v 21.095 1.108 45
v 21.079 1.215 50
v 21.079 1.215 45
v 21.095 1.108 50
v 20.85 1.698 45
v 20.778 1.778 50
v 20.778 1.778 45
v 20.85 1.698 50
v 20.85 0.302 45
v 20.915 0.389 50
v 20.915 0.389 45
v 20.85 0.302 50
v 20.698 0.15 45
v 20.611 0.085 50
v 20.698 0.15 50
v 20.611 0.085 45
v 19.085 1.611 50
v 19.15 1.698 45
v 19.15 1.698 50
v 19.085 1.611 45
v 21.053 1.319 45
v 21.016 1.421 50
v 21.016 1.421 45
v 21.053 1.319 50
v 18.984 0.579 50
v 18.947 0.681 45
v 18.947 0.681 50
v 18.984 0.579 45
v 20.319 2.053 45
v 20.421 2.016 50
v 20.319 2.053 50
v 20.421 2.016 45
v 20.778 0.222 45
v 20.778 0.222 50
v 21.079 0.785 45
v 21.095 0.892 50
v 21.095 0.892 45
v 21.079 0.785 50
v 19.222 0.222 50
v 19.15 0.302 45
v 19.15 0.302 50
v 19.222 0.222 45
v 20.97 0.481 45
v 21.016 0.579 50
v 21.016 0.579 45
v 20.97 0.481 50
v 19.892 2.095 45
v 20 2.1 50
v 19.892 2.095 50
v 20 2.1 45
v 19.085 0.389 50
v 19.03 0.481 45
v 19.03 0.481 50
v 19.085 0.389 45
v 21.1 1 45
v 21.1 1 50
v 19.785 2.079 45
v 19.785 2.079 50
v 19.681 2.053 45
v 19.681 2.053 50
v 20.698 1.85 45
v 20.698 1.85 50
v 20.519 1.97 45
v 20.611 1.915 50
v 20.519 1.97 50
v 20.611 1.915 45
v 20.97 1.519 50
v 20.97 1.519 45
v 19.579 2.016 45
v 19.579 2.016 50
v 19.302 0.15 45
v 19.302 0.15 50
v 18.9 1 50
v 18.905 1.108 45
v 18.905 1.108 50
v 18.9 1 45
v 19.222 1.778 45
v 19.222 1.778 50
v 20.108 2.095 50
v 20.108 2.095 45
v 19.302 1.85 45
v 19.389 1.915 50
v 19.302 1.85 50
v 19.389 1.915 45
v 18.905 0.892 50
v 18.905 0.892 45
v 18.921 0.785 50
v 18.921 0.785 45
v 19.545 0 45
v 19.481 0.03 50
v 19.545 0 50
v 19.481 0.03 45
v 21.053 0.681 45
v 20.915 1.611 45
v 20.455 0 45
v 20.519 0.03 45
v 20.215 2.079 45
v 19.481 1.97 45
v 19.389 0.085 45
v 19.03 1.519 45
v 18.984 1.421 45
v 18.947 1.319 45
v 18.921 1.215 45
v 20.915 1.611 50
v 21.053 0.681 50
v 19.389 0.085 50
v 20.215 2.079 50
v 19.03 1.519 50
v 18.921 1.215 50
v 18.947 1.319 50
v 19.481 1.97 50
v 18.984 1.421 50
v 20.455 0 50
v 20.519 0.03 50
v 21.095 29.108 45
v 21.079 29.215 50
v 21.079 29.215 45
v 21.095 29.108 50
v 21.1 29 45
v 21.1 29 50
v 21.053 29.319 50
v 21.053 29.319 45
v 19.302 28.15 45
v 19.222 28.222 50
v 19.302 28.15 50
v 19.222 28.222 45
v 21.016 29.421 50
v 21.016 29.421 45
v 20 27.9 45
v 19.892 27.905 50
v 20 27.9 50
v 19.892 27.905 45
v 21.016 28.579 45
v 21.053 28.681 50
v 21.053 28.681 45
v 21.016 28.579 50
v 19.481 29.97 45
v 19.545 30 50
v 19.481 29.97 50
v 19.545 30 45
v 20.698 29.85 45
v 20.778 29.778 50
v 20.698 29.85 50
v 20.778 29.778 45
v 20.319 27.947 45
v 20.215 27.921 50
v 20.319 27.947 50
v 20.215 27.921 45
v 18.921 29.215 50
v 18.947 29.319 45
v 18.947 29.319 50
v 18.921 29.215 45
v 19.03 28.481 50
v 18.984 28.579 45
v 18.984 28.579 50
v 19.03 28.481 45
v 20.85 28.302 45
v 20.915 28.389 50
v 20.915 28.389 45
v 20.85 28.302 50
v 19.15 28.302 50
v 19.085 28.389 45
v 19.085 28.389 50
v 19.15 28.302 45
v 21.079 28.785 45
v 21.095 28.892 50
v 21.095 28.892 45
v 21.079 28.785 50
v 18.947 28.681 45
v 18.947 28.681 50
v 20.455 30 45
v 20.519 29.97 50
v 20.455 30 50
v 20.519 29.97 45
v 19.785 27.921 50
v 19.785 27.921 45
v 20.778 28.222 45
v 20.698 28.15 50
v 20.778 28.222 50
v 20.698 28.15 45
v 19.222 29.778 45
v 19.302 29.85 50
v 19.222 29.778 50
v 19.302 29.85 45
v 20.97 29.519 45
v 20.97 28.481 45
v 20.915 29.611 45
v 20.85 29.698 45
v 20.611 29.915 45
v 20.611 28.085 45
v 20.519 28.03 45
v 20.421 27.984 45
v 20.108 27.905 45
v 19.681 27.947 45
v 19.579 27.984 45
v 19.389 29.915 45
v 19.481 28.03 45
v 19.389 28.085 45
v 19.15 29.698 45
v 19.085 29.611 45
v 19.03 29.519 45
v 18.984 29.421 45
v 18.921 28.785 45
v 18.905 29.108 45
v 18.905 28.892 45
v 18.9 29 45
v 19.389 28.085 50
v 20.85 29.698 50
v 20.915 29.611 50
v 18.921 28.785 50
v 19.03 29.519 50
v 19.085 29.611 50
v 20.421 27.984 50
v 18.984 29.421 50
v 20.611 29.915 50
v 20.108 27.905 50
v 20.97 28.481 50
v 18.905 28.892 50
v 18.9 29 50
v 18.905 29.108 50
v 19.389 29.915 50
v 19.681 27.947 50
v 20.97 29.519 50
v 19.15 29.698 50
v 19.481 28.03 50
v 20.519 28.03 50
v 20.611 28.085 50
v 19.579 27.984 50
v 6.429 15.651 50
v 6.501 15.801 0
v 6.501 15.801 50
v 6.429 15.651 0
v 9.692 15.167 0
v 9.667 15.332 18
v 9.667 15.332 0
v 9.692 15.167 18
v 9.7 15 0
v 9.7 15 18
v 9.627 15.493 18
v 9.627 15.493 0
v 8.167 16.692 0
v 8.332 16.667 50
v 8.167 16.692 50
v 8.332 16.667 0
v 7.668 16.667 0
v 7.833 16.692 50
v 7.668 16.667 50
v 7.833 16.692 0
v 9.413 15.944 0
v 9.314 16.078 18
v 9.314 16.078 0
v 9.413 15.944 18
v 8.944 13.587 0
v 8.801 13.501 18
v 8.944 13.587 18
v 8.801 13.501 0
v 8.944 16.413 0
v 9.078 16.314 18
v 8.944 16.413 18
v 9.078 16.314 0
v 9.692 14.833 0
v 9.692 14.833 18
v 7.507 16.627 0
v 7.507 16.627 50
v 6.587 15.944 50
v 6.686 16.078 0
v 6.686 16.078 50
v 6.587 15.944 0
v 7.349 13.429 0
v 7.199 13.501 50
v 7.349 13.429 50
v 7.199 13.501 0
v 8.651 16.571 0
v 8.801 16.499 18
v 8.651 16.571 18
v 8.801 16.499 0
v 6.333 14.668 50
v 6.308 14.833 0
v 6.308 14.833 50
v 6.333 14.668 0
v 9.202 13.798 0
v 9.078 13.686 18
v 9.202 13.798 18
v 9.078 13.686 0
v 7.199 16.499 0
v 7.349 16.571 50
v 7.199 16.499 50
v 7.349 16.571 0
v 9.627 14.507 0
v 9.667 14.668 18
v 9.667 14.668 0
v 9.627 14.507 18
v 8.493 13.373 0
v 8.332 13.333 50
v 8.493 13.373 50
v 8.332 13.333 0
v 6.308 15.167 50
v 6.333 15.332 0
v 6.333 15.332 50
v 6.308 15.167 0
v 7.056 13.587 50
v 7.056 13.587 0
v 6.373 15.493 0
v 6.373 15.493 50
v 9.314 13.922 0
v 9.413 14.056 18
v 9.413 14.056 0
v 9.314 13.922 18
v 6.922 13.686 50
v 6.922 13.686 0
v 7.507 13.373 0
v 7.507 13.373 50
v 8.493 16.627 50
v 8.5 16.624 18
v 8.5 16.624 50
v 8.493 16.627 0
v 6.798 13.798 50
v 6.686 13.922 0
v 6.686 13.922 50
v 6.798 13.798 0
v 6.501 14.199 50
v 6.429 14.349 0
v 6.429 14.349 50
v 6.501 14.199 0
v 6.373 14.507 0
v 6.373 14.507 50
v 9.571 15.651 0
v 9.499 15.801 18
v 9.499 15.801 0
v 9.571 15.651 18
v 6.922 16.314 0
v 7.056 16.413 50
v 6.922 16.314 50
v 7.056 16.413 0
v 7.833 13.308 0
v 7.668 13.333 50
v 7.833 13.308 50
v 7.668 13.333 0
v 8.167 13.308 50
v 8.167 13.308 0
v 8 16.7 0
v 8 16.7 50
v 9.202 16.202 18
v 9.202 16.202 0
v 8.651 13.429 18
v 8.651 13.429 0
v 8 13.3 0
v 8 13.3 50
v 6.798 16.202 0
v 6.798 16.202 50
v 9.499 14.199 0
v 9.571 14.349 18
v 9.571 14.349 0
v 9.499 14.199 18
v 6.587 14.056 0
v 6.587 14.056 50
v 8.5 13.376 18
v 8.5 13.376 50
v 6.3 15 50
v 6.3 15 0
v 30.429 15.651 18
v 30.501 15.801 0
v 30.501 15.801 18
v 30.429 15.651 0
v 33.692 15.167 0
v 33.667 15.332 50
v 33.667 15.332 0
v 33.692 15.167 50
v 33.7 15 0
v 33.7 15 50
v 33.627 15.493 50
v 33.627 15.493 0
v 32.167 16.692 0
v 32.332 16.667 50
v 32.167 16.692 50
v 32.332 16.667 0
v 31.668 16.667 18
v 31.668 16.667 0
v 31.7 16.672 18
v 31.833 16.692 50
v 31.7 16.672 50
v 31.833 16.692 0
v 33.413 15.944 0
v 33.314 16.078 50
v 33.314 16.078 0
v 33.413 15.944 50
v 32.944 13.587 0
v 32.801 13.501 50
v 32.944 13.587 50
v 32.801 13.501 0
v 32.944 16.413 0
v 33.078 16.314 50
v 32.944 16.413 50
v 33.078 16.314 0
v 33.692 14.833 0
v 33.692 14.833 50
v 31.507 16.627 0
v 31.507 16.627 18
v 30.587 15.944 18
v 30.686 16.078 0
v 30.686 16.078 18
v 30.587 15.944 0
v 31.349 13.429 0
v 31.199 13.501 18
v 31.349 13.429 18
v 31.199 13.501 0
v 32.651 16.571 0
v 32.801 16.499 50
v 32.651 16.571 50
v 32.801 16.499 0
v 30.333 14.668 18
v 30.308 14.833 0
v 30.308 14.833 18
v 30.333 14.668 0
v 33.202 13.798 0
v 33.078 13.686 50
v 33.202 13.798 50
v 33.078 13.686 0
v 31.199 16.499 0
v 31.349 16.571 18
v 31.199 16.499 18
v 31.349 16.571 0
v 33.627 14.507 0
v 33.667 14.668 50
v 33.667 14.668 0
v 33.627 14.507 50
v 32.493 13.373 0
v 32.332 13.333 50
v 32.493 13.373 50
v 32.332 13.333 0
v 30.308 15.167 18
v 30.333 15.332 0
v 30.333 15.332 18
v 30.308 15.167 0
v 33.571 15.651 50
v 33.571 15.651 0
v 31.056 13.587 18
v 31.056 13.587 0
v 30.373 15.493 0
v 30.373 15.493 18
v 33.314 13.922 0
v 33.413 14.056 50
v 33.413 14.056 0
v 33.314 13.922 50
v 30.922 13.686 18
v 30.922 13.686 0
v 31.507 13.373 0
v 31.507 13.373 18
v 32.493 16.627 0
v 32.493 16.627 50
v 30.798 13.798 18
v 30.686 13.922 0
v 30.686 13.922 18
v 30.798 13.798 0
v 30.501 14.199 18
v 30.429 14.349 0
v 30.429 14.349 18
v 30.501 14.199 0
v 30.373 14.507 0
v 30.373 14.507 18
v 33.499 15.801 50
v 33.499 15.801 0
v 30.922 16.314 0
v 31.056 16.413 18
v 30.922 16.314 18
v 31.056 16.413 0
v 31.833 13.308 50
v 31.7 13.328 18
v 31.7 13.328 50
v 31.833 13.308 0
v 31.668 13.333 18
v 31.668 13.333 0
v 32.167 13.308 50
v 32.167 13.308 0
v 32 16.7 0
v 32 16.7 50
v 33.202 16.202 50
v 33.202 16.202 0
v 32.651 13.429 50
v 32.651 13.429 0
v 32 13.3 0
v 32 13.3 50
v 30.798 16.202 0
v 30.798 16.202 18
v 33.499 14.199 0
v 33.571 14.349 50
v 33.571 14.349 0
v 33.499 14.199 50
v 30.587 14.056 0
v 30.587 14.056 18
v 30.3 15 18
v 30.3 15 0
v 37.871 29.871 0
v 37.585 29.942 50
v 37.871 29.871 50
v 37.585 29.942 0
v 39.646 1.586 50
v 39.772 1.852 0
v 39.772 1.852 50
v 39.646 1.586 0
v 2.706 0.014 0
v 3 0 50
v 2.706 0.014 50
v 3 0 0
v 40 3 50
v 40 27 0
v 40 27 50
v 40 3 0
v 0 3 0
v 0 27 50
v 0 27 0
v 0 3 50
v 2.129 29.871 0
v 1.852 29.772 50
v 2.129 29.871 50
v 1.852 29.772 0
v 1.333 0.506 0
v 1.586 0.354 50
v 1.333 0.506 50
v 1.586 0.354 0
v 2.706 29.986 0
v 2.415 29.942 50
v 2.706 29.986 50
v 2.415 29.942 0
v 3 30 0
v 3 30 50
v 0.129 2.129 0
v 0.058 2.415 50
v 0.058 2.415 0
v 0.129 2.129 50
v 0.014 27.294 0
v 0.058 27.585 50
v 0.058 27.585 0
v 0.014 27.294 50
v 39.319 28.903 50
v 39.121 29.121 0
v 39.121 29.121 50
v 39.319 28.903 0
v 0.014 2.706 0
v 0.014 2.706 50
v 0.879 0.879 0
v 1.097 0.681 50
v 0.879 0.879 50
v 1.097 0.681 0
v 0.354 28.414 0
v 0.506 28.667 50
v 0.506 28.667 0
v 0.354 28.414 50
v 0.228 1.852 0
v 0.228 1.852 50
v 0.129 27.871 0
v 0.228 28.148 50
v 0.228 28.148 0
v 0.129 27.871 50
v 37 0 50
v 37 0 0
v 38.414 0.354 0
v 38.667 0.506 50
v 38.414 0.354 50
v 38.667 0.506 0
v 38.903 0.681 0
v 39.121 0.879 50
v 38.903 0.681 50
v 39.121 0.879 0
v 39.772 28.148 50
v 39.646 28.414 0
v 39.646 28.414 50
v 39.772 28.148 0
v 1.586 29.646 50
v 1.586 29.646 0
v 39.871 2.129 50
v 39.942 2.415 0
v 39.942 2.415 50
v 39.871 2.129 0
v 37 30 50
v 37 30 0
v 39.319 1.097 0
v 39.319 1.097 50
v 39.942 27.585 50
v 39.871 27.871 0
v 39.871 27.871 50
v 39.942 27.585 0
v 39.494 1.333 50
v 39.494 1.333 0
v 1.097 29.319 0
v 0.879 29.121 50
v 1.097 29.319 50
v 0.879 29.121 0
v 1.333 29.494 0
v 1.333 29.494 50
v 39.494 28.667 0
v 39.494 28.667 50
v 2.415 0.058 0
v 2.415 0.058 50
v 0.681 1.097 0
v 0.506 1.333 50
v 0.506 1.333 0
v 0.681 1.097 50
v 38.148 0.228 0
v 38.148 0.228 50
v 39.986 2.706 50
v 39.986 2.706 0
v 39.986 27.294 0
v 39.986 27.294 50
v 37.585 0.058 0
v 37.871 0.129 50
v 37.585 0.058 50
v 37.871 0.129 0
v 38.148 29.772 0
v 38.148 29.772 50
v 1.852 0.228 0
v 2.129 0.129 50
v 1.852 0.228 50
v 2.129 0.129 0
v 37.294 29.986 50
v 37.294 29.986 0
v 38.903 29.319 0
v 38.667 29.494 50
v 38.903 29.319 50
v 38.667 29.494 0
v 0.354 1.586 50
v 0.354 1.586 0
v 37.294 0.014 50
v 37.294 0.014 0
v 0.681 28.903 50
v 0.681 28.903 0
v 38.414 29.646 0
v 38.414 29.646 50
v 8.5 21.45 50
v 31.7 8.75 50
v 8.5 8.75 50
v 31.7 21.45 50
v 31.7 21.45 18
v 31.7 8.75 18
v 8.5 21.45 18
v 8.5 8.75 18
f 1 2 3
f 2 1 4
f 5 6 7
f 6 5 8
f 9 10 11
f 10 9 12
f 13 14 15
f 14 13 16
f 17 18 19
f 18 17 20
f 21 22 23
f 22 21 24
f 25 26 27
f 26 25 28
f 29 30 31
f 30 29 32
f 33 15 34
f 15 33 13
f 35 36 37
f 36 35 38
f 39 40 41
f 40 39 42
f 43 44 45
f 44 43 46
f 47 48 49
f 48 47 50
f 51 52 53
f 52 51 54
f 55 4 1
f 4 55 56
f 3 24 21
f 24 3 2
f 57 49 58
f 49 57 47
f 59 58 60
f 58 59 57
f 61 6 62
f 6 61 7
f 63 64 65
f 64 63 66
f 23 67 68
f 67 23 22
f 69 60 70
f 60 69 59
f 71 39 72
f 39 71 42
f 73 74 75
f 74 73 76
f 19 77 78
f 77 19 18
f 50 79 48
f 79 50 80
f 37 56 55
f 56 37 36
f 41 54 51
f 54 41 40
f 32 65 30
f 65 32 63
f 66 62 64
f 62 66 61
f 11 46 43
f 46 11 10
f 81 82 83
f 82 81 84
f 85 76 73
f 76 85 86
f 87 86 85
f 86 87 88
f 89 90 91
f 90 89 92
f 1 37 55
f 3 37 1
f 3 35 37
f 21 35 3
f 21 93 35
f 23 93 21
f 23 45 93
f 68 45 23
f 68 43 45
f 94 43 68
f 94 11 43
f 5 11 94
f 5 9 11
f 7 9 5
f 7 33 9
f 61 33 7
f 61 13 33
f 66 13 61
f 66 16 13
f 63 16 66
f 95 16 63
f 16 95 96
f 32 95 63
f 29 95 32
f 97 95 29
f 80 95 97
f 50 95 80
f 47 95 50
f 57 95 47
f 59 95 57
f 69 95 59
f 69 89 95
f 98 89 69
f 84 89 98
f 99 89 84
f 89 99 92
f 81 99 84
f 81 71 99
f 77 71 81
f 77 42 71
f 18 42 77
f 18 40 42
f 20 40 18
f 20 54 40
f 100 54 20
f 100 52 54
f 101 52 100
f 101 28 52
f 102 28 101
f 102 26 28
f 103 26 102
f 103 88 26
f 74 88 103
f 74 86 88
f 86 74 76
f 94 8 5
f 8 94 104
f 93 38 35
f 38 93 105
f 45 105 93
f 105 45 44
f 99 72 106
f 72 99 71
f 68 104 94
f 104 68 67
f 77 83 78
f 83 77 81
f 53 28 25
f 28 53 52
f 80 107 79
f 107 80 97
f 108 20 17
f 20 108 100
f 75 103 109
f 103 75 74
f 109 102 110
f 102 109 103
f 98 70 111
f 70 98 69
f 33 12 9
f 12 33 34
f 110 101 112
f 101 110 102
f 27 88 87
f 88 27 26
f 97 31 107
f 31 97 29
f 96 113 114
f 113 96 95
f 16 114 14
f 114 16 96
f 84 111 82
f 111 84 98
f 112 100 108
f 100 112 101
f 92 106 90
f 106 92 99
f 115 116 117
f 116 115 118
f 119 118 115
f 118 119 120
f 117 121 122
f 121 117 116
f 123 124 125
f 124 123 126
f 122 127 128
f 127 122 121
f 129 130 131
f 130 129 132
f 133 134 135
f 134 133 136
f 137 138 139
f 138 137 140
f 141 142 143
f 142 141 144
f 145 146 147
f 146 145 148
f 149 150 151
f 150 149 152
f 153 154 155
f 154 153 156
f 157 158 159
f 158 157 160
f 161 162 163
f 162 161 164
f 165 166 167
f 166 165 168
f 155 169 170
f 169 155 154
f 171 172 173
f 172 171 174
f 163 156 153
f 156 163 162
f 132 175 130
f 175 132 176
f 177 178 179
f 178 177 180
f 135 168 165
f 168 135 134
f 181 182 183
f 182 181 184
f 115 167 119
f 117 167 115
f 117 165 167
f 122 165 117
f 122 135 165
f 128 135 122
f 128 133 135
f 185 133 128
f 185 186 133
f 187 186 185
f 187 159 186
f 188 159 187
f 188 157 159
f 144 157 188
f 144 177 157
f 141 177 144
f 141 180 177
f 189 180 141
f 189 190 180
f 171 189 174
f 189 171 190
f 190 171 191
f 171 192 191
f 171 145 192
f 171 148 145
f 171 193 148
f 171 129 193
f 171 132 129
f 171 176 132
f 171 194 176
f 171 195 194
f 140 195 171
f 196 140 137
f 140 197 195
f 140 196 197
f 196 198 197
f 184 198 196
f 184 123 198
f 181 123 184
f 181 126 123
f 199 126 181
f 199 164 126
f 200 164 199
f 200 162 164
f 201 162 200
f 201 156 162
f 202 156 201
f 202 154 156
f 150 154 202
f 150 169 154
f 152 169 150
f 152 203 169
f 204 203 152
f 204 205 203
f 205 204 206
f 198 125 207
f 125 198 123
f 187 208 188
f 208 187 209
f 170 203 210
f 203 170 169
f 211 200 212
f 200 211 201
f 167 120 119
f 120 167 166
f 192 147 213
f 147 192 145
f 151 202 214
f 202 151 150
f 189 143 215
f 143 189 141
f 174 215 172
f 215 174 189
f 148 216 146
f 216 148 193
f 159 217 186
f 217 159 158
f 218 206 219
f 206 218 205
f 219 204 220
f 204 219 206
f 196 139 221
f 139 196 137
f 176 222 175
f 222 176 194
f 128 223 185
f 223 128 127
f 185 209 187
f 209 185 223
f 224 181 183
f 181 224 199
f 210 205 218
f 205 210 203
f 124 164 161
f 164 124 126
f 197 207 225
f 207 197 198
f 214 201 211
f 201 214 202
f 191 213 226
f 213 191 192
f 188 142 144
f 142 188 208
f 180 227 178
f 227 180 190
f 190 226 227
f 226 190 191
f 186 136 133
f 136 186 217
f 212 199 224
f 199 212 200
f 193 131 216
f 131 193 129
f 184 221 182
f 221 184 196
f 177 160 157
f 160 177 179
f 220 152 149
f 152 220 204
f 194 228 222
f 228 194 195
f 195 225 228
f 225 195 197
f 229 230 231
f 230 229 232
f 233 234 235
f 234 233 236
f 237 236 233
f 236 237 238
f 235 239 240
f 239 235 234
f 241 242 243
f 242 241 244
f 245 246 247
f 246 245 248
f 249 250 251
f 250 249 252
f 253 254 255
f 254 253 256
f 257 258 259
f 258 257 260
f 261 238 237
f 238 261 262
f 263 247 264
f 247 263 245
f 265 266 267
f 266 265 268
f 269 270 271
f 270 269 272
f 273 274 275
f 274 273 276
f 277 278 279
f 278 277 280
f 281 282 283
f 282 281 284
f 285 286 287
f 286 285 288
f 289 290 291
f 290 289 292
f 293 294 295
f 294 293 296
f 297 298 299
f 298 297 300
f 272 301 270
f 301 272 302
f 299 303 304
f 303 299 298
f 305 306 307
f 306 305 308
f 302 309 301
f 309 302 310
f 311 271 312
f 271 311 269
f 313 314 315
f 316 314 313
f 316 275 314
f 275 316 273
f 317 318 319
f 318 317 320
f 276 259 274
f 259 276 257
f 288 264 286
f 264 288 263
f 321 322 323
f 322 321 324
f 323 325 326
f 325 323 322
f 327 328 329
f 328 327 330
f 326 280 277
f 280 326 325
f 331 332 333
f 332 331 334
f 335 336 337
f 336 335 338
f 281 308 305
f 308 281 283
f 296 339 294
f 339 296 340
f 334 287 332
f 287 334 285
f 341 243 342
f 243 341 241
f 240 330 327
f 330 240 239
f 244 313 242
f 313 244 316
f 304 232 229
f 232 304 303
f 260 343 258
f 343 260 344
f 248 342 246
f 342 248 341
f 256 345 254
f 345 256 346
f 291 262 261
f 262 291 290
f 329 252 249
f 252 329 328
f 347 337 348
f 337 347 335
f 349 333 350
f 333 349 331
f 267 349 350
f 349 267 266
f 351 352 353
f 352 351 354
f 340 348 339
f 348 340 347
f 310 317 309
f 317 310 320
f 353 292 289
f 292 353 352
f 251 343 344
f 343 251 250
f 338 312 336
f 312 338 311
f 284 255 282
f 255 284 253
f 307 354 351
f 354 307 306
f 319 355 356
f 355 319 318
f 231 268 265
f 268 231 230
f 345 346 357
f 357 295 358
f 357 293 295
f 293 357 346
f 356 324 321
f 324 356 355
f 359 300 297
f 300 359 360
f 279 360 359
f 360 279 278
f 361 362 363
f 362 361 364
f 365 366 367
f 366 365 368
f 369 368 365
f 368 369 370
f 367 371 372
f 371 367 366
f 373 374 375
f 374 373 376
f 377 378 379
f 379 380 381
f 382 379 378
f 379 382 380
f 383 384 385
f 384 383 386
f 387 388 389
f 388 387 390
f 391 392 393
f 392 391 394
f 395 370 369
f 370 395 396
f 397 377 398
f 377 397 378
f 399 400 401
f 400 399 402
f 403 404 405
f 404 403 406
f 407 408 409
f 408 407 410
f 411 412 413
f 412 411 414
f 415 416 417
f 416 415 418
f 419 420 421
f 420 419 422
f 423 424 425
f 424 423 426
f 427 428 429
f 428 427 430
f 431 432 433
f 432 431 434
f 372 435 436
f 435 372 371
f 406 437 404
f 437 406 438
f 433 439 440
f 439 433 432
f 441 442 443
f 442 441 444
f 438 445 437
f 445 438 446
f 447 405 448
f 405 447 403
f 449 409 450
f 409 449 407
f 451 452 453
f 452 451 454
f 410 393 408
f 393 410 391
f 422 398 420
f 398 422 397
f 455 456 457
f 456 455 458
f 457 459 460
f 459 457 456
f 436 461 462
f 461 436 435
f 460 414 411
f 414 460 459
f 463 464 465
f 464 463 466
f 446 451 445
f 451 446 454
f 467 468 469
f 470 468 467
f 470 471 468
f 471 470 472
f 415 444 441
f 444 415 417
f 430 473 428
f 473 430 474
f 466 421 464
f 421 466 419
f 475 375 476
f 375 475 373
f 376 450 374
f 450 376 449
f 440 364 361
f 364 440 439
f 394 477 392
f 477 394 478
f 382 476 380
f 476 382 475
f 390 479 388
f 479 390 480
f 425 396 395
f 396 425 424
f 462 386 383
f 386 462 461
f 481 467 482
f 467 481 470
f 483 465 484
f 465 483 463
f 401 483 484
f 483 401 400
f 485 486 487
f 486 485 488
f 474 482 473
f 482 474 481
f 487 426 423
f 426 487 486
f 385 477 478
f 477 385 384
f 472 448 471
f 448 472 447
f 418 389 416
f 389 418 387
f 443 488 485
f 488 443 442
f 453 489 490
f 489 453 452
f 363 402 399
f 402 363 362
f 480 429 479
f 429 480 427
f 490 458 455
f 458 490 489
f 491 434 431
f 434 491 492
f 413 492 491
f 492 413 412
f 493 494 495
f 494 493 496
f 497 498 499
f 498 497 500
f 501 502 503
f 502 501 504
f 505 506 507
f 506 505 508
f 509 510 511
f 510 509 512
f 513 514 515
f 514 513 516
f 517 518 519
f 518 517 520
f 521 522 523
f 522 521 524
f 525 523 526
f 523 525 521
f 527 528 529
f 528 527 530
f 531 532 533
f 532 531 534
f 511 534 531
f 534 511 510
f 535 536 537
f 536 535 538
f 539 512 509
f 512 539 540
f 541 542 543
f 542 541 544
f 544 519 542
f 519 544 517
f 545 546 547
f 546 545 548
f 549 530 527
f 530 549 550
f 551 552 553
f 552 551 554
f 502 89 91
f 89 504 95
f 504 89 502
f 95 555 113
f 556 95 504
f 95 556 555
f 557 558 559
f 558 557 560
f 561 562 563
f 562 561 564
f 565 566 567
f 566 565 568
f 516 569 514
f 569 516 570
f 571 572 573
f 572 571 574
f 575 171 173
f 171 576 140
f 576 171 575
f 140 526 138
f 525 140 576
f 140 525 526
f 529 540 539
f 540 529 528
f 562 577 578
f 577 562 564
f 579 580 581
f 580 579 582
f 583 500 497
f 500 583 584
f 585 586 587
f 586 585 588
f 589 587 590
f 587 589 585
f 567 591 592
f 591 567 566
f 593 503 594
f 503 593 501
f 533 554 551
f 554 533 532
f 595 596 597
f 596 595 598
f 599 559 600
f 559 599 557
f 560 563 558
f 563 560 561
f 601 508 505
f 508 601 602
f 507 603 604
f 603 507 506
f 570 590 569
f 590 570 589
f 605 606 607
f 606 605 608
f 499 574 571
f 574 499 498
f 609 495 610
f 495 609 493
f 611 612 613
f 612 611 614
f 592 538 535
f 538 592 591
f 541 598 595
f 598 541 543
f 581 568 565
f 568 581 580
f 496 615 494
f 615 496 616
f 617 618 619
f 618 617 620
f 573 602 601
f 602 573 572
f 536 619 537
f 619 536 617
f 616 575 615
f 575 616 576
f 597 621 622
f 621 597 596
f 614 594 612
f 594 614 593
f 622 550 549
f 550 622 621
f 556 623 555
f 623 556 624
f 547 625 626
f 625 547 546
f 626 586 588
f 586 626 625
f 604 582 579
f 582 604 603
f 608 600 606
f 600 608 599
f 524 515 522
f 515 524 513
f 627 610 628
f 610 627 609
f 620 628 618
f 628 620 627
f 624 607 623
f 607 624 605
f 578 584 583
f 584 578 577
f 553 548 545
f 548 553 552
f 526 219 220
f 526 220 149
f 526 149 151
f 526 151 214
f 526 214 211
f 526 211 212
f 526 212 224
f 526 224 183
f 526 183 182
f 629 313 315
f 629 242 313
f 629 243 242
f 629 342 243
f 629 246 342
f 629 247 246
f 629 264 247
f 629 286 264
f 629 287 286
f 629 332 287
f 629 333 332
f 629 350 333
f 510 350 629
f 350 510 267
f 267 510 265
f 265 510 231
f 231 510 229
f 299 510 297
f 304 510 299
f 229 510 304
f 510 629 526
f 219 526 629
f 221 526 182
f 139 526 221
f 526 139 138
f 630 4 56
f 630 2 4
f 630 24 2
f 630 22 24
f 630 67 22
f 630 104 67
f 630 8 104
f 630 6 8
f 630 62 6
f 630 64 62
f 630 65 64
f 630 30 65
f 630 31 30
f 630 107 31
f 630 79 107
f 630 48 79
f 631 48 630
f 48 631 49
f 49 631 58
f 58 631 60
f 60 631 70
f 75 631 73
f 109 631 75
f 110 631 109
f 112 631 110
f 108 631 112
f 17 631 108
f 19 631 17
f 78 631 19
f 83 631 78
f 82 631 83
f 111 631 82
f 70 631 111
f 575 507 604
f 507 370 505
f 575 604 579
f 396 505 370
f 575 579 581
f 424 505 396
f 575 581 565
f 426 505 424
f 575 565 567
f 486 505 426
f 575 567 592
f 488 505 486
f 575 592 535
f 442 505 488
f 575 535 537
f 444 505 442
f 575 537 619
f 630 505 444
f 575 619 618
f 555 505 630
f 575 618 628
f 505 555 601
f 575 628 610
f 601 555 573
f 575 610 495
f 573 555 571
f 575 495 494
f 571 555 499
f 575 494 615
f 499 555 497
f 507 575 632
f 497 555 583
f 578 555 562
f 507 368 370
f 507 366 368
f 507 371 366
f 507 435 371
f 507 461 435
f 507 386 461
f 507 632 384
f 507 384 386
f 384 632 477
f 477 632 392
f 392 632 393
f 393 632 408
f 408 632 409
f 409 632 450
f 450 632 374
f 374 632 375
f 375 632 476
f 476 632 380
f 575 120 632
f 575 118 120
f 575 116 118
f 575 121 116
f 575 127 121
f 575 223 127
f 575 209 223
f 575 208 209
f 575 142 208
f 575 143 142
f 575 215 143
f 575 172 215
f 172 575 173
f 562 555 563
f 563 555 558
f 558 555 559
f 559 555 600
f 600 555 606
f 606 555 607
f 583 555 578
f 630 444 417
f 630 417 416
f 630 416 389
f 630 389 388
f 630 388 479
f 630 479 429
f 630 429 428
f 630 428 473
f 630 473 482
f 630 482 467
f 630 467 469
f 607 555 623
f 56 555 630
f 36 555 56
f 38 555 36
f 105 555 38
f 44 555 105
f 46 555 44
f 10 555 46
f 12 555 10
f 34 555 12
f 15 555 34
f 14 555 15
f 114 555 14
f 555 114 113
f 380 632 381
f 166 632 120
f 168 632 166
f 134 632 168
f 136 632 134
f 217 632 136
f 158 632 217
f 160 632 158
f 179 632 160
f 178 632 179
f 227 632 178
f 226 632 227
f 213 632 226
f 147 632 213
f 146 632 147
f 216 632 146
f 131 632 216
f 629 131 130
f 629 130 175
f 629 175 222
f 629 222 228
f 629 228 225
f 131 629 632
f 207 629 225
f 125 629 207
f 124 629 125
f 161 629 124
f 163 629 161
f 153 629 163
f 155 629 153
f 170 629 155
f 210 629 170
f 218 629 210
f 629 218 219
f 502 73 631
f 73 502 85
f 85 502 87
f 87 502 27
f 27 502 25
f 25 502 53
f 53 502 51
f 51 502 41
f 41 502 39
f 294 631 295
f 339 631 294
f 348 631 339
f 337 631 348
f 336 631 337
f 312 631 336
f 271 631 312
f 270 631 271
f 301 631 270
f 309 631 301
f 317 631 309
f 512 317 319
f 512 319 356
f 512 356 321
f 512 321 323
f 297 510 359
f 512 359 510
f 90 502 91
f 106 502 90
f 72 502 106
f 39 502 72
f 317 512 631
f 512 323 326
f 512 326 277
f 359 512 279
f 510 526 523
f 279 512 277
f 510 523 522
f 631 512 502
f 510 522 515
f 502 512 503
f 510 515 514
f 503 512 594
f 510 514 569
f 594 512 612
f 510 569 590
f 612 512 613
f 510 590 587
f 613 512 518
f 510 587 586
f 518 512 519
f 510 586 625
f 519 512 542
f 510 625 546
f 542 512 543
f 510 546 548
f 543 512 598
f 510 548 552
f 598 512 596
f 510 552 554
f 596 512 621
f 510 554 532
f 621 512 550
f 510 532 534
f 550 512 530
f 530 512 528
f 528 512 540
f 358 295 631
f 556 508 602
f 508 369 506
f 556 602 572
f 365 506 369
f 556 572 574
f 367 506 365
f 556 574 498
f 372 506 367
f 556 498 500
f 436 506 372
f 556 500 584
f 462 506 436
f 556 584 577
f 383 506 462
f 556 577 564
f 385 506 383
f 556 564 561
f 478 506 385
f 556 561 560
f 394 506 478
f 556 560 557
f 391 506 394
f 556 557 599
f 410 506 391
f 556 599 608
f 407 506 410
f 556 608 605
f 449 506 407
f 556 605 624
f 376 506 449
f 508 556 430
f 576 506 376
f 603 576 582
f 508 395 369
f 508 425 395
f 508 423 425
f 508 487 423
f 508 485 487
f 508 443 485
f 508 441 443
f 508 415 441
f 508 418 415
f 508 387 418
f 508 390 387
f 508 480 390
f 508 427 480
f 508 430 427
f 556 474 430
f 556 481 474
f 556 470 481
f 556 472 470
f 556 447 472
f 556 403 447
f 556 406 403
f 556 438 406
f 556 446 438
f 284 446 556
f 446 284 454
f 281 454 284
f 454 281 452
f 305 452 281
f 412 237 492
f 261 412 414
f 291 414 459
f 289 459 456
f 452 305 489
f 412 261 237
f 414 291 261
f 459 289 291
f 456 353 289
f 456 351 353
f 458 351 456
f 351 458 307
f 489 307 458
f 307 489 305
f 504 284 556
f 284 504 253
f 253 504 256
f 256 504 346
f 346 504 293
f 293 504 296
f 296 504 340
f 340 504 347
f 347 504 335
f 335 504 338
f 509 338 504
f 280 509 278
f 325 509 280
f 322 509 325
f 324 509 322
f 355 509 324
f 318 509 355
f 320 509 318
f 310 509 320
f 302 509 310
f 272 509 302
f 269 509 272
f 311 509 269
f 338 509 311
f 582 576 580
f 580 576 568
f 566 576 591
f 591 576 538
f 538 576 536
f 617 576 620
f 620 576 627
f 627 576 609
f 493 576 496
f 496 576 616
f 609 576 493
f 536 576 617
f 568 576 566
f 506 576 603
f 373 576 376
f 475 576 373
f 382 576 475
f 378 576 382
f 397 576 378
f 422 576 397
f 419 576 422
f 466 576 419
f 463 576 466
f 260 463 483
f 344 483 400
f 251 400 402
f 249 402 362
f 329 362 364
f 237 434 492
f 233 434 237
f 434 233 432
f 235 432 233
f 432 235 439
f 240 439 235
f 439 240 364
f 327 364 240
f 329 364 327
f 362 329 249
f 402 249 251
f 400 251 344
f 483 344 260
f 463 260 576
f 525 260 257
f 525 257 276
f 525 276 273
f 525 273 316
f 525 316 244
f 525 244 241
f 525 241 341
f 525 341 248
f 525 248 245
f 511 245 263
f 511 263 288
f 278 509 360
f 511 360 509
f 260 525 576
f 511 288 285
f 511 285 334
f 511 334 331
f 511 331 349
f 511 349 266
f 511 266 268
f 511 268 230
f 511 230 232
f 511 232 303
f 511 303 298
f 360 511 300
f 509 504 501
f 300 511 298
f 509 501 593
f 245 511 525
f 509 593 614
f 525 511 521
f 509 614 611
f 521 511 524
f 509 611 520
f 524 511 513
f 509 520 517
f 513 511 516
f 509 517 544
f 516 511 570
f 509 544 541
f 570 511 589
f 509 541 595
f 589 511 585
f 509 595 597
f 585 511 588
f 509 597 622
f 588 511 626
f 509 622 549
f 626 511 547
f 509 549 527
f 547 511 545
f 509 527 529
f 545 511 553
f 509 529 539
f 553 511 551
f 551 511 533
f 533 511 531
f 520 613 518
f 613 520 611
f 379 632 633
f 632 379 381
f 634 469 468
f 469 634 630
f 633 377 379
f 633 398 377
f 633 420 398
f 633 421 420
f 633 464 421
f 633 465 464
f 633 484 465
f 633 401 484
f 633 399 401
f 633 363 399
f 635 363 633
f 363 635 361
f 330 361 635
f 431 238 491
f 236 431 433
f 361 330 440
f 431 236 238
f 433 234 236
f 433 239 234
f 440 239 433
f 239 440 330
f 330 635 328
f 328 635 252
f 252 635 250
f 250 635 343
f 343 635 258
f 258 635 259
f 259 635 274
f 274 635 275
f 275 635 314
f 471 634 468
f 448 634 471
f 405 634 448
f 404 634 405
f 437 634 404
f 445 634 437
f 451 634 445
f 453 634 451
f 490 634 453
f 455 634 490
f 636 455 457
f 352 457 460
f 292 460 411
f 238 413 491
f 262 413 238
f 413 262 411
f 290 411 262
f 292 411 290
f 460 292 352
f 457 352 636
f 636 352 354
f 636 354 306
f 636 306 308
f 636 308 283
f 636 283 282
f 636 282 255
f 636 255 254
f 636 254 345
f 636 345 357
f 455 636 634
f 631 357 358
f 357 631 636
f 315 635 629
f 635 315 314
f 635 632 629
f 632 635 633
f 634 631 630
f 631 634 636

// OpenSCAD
// file: params.scad
// Cat Feeder 5000 — Shared Parameters & Common Modules
// Include this file first in all part files: include <params.scad>

// ===== DIMENSIONS =====
WALL = 3;                // Standard wall thickness (mm)
THIN_WALL = 2.5;         // Thin walls (antenna arch, etc.)
FLOOR = 4;               // Base floor thickness
INSERT_BORE = 4.7;       // M3 heat-set insert pocket bore
M3_CLEAR = 3.4;          // M3 clearance hole
UNIT_W = 160;            // Main body width
UNIT_D = 240;            // Main body depth
UNIT_H = 160;            // Main body height
GATE_W = 118;            // Gate flap width
GATE_H = 90;             // Gate flap height
GATE_T = 3;              // Gate flap thickness
GATE_ROD_D = 3.2;        // Gate hinge rod diameter
ARCH_SPAN = 160;         // Antenna arch left-to-right span
ARCH_H = 70;             // Antenna arch height
ARCH_D = 40;             // Antenna arch depth (front-to-back)
COIL_CH_W = 16;          // Coil channel width
COIL_CH_D = 5;           // Coil channel depth
SERVO_W = 23;            // SG90 servo width
SERVO_D = 12.5;          // SG90 servo depth
SERVO_H = 30;            // SG90 servo height
SERVO_EAR_SPAN = 28;     // SG90 servo ear spacing
TOLERANCE = 0.1;         // General fit tolerance

// ===== RENDER QUALITY =====
$fn = 64;                // Circle resolution (smooth curves)

// ===== COLORS =====
COL_RFID = [0.8, 0.2, 0.2, 0.8];      // Red — RFID antenna arch
COL_TPU = [0.4, 0.7, 0.3, 0.8];       // Green — TPU flexible parts
COL_GATE = [0.2, 0.5, 0.8, 0.8];      // Blue — Gate mechanism
COL_BODY = [0.6, 0.6, 0.6, 0.8];      // Gray — Main body structure

// ===== COMMON MODULES =====

// M3 heat-set insert pocket (bore hole for pressed insert)
module m3_insert(h = 8) {
    cylinder(d = INSERT_BORE, h = h);
}

// M3 clearance hole (for bolt pass-through)
module m3_clear(h = 8) {
    cylinder(d = M3_CLEAR, h = h);
}

// Fillet box: rectangular box with filleted corners
// w, d, h = width, depth, height; r = corner radius
module fillet_box(w, d, h, r = 2) {
    hull() {
        translate([r, r, 0])
            cylinder(r = r, h = h);
        translate([w - r, r, 0])
            cylinder(r = r, h = h);
        translate([r, d - r, 0])
            cylinder(r = r, h = h);
        translate([w - r, d - r, 0])
            cylinder(r = r, h = h);
    }
}

// Boss: raised circular pad with M3 pocket
// Useful for internal reinforcement at bolt points
module boss(d = 10, h = 4, pocket = true) {
    difference() {
        cylinder(d = d, h = h);
        if (pocket)
            translate([0, 0, -0.1])
                m3_clear(h = h + 0.2);
    }
}
// main file
// Cat Feeder 5000 — Part 16: Gate Servo Bracket
// Mounts SG90 servo inside feeder body. Linkage arm connects to gate flap top.
// Print: PETG, 0.2mm layers, 40% infill, no supports

include <params.scad>

color(COL_GATE) gate_servo_bracket();

module gate_servo_bracket() {
    BW = 40; BD = 30; BH = 50;
    // SG90 body: 23mm × 12.5mm × 30mm
    SW = SERVO_W; SD = SERVO_D; SH = SERVO_H;
    EAR = SERVO_EAR_SPAN;   // 28mm ear spacing

    difference() {
        fillet_box(BW, BD, BH, r=3);

        // Servo pocket (centered, open top)
        translate([(BW - SW)/2, (BD - SD)/2, BH - SH - 2])
            cube([SW + TOLERANCE*2, SD + TOLERANCE*2, SH + 2.1]);

        // Servo ear mount holes (M2, ×2)
        for (y = [(BD - EAR)/2, (BD + EAR)/2])
            translate([BW/2, y, BH - 5])
                cylinder(d=2.2, h=6);

        // Body attachment holes (M3 clearance, ×2)
        for (x = [8, BW - 8])
            translate([x, BD/2, -0.1])
                m3_clear(h=BH + 0.2);

        // Linkage arm exit slot (top, for servo horn arm to pass through)
        translate([BW/2 - 4, (BD - 3)/2, BH - 3])
            cube([8, 3, 4]);
    }
}
